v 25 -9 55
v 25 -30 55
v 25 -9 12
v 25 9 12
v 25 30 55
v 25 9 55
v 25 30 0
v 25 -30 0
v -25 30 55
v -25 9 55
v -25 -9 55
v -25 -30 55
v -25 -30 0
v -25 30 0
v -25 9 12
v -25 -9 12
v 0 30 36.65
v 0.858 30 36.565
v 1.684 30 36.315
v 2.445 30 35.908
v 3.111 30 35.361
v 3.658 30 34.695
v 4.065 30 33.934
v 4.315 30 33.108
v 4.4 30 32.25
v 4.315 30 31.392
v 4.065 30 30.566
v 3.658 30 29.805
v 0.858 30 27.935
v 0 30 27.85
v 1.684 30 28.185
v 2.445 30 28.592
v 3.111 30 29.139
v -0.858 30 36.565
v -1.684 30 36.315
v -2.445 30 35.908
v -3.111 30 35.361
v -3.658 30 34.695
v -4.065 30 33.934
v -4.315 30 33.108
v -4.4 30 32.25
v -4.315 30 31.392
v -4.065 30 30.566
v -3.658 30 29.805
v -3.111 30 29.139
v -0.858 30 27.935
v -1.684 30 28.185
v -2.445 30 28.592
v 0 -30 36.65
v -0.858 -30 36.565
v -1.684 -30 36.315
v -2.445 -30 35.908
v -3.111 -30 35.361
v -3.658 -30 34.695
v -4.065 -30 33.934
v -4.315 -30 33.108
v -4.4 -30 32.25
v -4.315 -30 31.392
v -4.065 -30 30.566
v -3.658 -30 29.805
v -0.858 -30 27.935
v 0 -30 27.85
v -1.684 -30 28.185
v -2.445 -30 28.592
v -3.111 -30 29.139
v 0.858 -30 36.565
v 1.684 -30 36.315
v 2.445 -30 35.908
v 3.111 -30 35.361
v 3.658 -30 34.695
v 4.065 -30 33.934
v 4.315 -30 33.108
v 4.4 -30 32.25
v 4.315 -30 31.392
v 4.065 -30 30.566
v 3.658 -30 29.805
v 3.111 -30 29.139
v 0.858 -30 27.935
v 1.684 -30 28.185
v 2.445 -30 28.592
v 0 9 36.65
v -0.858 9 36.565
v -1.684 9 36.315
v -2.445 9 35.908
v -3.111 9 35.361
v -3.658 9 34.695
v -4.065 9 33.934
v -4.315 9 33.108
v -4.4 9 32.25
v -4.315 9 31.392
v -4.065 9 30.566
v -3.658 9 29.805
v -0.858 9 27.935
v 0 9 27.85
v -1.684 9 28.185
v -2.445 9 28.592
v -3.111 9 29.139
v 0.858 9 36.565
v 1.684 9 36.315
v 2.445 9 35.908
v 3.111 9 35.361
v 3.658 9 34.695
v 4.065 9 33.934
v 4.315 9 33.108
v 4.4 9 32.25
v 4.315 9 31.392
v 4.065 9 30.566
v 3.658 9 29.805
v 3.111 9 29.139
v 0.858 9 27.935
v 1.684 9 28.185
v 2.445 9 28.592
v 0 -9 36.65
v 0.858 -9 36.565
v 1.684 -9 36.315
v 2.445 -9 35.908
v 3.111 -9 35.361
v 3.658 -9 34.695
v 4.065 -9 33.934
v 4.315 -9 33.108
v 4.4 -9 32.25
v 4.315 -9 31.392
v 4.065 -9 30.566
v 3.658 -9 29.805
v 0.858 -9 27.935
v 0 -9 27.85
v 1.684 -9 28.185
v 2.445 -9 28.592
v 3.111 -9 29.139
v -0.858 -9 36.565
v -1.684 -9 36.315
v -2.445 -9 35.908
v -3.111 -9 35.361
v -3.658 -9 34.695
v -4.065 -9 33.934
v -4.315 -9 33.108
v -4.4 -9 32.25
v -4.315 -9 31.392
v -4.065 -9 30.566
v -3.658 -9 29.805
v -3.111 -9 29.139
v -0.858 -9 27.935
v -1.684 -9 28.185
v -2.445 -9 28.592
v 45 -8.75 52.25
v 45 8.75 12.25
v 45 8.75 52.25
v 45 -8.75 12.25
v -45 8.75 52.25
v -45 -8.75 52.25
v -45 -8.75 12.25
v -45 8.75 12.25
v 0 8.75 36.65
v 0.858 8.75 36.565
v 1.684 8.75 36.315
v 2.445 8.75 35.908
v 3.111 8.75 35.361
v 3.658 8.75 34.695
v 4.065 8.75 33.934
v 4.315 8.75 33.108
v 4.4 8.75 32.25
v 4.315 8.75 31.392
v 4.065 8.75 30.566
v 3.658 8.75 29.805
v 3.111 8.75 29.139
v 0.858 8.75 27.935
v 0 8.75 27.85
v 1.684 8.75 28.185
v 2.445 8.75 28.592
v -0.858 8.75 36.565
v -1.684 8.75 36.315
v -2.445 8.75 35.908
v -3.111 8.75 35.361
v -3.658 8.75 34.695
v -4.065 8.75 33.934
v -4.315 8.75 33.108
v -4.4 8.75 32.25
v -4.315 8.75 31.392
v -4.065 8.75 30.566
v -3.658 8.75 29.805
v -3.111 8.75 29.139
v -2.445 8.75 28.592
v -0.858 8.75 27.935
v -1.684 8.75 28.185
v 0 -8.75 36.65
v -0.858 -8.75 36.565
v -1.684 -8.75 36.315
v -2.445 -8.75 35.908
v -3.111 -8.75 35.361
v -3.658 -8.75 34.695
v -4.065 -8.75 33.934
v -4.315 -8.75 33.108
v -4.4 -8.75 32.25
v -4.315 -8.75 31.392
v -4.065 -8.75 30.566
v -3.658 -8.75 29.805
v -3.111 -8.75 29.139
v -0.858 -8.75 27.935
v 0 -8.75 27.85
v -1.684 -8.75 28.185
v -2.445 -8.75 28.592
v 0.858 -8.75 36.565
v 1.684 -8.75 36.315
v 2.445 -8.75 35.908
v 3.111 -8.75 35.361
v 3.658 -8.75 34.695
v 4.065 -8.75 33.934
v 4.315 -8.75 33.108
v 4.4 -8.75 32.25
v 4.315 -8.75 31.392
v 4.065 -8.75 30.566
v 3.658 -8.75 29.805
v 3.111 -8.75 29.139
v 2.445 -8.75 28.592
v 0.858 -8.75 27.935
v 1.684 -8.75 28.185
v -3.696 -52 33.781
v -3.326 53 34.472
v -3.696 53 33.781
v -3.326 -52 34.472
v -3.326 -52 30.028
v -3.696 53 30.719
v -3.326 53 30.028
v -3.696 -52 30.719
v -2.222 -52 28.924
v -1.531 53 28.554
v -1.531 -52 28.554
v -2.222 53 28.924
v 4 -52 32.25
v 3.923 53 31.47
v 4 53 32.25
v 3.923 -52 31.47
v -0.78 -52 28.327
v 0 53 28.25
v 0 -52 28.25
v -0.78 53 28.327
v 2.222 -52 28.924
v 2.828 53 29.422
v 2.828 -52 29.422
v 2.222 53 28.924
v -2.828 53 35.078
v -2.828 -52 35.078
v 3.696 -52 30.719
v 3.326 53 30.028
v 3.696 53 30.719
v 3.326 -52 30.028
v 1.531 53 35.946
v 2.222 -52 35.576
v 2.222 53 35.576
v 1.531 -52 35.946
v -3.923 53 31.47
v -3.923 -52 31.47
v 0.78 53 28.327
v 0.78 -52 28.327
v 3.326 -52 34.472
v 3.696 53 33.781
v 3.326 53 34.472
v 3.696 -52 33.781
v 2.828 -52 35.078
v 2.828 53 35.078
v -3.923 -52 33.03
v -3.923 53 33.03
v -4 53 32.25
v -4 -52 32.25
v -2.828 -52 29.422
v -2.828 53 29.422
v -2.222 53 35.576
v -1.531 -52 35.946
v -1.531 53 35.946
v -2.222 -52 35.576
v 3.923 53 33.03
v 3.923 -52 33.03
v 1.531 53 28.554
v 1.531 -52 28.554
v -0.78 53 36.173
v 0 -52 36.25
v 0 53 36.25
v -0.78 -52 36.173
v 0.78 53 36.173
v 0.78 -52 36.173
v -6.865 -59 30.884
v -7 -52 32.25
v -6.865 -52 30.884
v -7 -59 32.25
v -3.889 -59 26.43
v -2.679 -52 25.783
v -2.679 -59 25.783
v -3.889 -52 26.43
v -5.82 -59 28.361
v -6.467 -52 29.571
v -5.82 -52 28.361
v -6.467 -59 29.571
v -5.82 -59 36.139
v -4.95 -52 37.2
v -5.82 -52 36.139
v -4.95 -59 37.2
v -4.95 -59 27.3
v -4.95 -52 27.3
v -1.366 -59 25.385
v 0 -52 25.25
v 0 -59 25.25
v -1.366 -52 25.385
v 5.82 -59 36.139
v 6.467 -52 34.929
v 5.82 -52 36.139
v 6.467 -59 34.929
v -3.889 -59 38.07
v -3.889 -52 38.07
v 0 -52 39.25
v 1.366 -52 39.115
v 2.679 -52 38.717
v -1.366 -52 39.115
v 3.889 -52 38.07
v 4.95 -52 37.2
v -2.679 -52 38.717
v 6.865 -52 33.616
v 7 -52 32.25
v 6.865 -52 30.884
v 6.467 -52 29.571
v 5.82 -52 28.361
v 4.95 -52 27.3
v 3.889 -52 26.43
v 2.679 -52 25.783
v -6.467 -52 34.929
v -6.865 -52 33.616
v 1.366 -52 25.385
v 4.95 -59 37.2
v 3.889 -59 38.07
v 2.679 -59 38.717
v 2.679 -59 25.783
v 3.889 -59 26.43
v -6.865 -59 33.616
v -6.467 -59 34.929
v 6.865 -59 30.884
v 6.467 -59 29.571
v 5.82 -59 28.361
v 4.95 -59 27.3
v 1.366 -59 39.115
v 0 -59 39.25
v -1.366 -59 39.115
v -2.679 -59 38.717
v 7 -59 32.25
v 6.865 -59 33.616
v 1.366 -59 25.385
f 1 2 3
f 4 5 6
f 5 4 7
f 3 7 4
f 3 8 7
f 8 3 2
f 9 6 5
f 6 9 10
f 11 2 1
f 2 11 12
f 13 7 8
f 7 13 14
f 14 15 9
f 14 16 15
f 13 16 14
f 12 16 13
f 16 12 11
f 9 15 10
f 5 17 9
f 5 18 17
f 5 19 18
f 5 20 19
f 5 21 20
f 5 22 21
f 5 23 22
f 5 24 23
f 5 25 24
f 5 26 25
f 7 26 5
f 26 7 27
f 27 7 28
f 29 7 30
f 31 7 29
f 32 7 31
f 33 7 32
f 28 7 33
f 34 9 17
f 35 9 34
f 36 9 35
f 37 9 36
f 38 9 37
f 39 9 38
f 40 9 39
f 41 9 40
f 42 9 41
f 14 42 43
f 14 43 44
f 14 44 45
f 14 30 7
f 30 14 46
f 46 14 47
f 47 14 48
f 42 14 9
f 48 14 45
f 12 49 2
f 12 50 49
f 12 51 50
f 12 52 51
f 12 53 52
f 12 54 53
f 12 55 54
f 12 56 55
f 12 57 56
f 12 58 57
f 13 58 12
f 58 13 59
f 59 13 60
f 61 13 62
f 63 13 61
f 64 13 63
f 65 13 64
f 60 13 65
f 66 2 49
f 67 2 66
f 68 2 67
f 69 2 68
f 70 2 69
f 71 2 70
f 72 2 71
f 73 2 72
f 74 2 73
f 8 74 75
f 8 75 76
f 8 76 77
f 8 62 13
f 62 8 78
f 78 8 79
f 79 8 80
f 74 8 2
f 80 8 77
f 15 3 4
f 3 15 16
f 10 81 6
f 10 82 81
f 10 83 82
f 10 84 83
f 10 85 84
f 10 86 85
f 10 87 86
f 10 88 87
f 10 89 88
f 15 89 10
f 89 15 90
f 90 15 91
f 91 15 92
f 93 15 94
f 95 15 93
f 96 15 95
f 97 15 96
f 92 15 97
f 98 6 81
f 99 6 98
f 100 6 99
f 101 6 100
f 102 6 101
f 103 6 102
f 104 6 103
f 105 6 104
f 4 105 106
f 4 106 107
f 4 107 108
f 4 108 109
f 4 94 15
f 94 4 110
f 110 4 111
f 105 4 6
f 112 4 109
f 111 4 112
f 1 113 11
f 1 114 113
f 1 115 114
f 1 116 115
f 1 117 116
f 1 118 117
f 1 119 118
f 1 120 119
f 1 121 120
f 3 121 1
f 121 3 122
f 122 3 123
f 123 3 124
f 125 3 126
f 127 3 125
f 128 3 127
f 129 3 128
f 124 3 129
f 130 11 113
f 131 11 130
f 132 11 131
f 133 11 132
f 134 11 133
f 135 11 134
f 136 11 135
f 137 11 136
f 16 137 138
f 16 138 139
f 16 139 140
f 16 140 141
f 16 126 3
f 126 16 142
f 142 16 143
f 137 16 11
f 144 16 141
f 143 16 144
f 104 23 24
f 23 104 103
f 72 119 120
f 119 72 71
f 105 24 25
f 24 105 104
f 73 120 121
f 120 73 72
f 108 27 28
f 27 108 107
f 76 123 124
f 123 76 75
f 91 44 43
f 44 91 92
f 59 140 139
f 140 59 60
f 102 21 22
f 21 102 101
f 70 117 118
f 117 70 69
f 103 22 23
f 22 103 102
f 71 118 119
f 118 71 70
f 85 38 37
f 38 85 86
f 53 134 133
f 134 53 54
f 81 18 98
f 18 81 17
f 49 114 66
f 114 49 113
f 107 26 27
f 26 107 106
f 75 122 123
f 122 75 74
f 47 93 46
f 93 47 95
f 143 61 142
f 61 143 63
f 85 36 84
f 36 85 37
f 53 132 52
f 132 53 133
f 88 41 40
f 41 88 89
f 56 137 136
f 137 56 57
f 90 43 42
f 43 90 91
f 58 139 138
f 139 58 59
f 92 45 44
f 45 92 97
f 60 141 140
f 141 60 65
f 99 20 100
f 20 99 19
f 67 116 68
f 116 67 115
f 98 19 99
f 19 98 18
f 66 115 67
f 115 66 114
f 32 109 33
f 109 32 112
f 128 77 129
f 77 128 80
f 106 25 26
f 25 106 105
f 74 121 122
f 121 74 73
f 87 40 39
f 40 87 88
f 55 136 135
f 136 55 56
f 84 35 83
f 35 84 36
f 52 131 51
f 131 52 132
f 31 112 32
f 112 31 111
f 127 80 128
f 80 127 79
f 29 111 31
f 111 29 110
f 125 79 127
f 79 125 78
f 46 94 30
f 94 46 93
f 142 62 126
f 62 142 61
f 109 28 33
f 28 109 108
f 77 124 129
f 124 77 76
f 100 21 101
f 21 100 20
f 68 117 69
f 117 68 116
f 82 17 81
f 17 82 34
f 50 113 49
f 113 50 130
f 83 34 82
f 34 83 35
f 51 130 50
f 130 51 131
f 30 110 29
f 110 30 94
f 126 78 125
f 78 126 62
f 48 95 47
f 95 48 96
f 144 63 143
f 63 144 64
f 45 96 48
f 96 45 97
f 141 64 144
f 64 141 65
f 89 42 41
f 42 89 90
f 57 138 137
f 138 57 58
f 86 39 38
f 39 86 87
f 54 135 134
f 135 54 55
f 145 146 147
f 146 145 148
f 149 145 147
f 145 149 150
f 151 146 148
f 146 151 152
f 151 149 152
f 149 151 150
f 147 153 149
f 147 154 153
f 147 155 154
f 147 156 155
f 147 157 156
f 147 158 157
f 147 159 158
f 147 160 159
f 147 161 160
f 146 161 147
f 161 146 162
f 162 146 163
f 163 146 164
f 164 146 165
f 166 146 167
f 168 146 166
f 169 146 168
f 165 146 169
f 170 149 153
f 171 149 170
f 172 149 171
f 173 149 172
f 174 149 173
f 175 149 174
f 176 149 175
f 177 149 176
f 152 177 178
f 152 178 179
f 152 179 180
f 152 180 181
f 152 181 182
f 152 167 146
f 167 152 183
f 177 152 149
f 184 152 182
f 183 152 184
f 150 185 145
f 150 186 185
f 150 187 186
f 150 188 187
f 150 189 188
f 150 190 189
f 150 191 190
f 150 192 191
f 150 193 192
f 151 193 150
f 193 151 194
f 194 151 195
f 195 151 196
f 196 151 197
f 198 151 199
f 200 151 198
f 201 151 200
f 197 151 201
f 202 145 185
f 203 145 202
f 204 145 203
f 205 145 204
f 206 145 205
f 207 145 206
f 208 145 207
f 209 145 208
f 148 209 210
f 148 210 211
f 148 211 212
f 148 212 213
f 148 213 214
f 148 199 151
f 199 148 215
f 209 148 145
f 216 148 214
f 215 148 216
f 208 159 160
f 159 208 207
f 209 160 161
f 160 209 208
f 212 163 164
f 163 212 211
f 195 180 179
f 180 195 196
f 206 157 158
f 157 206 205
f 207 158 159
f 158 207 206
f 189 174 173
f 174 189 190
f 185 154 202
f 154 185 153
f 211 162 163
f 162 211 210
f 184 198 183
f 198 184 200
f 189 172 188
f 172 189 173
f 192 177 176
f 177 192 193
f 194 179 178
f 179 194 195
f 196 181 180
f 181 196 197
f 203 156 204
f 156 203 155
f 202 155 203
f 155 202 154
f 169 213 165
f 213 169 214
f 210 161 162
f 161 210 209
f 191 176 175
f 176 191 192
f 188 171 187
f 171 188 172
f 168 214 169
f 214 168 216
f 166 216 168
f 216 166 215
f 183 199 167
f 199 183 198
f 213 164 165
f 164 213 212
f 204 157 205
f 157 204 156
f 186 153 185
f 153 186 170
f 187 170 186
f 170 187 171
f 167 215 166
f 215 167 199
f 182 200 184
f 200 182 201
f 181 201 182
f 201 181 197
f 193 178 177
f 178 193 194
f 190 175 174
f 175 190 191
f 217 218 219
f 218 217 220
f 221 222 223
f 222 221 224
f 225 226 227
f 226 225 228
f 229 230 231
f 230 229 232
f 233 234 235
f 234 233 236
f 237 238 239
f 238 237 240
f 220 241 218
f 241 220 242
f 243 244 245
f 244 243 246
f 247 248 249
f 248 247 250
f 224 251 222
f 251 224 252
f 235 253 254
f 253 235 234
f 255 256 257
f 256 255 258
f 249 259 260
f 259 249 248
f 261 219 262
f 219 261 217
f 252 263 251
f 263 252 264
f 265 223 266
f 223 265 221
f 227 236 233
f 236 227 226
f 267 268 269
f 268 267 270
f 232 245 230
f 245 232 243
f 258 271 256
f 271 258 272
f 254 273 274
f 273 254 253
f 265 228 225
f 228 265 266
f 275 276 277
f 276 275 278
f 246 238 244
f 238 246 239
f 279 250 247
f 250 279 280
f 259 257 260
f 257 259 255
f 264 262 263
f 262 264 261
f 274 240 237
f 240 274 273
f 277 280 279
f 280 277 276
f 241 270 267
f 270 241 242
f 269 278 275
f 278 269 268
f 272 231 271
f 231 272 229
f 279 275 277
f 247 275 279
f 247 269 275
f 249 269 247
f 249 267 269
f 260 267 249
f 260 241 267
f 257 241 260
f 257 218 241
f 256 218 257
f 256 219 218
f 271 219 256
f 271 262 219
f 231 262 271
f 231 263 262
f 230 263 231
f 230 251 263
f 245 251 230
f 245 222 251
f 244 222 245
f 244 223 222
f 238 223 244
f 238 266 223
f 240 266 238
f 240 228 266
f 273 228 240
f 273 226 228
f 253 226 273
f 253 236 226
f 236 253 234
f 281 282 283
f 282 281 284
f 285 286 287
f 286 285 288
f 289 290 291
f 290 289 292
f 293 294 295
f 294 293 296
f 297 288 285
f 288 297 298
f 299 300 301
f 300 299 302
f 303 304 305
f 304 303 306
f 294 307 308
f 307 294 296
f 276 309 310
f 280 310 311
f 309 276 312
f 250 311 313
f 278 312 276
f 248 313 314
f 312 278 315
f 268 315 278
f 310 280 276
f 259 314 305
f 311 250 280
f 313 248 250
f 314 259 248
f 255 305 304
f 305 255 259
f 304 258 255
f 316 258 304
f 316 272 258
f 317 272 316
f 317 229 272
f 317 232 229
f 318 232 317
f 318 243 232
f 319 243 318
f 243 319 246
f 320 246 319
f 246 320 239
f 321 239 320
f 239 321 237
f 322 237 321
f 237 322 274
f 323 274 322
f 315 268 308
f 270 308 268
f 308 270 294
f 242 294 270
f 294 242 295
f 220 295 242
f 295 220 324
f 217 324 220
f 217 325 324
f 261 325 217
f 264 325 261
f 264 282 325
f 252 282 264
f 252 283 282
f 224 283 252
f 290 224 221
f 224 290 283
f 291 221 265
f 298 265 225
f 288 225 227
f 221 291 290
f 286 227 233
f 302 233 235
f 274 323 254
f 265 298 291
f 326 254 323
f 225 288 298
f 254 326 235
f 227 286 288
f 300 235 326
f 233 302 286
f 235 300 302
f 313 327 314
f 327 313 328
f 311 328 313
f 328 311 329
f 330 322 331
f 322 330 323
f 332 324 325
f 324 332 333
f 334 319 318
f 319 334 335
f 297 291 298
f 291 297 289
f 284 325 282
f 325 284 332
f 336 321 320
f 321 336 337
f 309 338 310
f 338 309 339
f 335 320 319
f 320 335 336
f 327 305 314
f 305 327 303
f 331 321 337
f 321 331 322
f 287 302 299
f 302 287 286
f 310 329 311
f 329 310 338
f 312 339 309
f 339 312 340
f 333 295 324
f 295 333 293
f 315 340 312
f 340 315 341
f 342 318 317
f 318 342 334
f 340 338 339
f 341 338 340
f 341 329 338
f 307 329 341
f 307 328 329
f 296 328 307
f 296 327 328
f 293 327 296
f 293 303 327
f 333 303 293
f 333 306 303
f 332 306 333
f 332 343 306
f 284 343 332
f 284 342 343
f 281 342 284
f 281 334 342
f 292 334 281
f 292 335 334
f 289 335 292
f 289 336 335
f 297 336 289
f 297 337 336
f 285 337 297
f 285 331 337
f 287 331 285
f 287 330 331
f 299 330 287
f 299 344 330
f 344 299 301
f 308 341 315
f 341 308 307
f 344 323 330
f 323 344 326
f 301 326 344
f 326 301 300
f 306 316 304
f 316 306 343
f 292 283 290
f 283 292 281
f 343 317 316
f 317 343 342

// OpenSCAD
$fn = 32;

// ------------------------------------------------------------------------
// Clevis joint: 50 mm clevis, pin d8
// Every part is its own module, assembly() places them once.
// ------------------------------------------------------------------------

// --- part 1 ---
module clevis() {
  difference() {
    translate([-25, -30, 0]) cube([50, 60, 55]);
    translate([-26, -9, 12]) cube([52, 18, 44]);
    translate([0, 0, 32.25]) rotate([90, 0, 0]) cylinder(h = 62, d = 8.8, center = true);
  }
}

// --- part 2 ---
module eye() {
  difference() {
    translate([-45, -8.75, 0]) cube([90, 17.5, 40]);
    translate([0, 0, 20]) rotate([90, 0, 0]) cylinder(h = 19.5, d = 8.8, center = true);
  }
}

// --- part 3 ---
module pin() {
  rotate([0, 90, 0]) cylinder(h = 106, d = 8, center = true);
  translate([-59, 0, 0]) rotate([0, 90, 0]) cylinder(h = 7, d = 14);
}

// --- assembly ---
module assembly() {
  translate([0, 0, 0]) rotate([0, 0, 0]) clevis();
  translate([0, 0, 12.25]) rotate([0, 0, 0]) eye();
  translate([0, 0, 32.25]) rotate([0, 0, 90]) pin();
}

assembly();
